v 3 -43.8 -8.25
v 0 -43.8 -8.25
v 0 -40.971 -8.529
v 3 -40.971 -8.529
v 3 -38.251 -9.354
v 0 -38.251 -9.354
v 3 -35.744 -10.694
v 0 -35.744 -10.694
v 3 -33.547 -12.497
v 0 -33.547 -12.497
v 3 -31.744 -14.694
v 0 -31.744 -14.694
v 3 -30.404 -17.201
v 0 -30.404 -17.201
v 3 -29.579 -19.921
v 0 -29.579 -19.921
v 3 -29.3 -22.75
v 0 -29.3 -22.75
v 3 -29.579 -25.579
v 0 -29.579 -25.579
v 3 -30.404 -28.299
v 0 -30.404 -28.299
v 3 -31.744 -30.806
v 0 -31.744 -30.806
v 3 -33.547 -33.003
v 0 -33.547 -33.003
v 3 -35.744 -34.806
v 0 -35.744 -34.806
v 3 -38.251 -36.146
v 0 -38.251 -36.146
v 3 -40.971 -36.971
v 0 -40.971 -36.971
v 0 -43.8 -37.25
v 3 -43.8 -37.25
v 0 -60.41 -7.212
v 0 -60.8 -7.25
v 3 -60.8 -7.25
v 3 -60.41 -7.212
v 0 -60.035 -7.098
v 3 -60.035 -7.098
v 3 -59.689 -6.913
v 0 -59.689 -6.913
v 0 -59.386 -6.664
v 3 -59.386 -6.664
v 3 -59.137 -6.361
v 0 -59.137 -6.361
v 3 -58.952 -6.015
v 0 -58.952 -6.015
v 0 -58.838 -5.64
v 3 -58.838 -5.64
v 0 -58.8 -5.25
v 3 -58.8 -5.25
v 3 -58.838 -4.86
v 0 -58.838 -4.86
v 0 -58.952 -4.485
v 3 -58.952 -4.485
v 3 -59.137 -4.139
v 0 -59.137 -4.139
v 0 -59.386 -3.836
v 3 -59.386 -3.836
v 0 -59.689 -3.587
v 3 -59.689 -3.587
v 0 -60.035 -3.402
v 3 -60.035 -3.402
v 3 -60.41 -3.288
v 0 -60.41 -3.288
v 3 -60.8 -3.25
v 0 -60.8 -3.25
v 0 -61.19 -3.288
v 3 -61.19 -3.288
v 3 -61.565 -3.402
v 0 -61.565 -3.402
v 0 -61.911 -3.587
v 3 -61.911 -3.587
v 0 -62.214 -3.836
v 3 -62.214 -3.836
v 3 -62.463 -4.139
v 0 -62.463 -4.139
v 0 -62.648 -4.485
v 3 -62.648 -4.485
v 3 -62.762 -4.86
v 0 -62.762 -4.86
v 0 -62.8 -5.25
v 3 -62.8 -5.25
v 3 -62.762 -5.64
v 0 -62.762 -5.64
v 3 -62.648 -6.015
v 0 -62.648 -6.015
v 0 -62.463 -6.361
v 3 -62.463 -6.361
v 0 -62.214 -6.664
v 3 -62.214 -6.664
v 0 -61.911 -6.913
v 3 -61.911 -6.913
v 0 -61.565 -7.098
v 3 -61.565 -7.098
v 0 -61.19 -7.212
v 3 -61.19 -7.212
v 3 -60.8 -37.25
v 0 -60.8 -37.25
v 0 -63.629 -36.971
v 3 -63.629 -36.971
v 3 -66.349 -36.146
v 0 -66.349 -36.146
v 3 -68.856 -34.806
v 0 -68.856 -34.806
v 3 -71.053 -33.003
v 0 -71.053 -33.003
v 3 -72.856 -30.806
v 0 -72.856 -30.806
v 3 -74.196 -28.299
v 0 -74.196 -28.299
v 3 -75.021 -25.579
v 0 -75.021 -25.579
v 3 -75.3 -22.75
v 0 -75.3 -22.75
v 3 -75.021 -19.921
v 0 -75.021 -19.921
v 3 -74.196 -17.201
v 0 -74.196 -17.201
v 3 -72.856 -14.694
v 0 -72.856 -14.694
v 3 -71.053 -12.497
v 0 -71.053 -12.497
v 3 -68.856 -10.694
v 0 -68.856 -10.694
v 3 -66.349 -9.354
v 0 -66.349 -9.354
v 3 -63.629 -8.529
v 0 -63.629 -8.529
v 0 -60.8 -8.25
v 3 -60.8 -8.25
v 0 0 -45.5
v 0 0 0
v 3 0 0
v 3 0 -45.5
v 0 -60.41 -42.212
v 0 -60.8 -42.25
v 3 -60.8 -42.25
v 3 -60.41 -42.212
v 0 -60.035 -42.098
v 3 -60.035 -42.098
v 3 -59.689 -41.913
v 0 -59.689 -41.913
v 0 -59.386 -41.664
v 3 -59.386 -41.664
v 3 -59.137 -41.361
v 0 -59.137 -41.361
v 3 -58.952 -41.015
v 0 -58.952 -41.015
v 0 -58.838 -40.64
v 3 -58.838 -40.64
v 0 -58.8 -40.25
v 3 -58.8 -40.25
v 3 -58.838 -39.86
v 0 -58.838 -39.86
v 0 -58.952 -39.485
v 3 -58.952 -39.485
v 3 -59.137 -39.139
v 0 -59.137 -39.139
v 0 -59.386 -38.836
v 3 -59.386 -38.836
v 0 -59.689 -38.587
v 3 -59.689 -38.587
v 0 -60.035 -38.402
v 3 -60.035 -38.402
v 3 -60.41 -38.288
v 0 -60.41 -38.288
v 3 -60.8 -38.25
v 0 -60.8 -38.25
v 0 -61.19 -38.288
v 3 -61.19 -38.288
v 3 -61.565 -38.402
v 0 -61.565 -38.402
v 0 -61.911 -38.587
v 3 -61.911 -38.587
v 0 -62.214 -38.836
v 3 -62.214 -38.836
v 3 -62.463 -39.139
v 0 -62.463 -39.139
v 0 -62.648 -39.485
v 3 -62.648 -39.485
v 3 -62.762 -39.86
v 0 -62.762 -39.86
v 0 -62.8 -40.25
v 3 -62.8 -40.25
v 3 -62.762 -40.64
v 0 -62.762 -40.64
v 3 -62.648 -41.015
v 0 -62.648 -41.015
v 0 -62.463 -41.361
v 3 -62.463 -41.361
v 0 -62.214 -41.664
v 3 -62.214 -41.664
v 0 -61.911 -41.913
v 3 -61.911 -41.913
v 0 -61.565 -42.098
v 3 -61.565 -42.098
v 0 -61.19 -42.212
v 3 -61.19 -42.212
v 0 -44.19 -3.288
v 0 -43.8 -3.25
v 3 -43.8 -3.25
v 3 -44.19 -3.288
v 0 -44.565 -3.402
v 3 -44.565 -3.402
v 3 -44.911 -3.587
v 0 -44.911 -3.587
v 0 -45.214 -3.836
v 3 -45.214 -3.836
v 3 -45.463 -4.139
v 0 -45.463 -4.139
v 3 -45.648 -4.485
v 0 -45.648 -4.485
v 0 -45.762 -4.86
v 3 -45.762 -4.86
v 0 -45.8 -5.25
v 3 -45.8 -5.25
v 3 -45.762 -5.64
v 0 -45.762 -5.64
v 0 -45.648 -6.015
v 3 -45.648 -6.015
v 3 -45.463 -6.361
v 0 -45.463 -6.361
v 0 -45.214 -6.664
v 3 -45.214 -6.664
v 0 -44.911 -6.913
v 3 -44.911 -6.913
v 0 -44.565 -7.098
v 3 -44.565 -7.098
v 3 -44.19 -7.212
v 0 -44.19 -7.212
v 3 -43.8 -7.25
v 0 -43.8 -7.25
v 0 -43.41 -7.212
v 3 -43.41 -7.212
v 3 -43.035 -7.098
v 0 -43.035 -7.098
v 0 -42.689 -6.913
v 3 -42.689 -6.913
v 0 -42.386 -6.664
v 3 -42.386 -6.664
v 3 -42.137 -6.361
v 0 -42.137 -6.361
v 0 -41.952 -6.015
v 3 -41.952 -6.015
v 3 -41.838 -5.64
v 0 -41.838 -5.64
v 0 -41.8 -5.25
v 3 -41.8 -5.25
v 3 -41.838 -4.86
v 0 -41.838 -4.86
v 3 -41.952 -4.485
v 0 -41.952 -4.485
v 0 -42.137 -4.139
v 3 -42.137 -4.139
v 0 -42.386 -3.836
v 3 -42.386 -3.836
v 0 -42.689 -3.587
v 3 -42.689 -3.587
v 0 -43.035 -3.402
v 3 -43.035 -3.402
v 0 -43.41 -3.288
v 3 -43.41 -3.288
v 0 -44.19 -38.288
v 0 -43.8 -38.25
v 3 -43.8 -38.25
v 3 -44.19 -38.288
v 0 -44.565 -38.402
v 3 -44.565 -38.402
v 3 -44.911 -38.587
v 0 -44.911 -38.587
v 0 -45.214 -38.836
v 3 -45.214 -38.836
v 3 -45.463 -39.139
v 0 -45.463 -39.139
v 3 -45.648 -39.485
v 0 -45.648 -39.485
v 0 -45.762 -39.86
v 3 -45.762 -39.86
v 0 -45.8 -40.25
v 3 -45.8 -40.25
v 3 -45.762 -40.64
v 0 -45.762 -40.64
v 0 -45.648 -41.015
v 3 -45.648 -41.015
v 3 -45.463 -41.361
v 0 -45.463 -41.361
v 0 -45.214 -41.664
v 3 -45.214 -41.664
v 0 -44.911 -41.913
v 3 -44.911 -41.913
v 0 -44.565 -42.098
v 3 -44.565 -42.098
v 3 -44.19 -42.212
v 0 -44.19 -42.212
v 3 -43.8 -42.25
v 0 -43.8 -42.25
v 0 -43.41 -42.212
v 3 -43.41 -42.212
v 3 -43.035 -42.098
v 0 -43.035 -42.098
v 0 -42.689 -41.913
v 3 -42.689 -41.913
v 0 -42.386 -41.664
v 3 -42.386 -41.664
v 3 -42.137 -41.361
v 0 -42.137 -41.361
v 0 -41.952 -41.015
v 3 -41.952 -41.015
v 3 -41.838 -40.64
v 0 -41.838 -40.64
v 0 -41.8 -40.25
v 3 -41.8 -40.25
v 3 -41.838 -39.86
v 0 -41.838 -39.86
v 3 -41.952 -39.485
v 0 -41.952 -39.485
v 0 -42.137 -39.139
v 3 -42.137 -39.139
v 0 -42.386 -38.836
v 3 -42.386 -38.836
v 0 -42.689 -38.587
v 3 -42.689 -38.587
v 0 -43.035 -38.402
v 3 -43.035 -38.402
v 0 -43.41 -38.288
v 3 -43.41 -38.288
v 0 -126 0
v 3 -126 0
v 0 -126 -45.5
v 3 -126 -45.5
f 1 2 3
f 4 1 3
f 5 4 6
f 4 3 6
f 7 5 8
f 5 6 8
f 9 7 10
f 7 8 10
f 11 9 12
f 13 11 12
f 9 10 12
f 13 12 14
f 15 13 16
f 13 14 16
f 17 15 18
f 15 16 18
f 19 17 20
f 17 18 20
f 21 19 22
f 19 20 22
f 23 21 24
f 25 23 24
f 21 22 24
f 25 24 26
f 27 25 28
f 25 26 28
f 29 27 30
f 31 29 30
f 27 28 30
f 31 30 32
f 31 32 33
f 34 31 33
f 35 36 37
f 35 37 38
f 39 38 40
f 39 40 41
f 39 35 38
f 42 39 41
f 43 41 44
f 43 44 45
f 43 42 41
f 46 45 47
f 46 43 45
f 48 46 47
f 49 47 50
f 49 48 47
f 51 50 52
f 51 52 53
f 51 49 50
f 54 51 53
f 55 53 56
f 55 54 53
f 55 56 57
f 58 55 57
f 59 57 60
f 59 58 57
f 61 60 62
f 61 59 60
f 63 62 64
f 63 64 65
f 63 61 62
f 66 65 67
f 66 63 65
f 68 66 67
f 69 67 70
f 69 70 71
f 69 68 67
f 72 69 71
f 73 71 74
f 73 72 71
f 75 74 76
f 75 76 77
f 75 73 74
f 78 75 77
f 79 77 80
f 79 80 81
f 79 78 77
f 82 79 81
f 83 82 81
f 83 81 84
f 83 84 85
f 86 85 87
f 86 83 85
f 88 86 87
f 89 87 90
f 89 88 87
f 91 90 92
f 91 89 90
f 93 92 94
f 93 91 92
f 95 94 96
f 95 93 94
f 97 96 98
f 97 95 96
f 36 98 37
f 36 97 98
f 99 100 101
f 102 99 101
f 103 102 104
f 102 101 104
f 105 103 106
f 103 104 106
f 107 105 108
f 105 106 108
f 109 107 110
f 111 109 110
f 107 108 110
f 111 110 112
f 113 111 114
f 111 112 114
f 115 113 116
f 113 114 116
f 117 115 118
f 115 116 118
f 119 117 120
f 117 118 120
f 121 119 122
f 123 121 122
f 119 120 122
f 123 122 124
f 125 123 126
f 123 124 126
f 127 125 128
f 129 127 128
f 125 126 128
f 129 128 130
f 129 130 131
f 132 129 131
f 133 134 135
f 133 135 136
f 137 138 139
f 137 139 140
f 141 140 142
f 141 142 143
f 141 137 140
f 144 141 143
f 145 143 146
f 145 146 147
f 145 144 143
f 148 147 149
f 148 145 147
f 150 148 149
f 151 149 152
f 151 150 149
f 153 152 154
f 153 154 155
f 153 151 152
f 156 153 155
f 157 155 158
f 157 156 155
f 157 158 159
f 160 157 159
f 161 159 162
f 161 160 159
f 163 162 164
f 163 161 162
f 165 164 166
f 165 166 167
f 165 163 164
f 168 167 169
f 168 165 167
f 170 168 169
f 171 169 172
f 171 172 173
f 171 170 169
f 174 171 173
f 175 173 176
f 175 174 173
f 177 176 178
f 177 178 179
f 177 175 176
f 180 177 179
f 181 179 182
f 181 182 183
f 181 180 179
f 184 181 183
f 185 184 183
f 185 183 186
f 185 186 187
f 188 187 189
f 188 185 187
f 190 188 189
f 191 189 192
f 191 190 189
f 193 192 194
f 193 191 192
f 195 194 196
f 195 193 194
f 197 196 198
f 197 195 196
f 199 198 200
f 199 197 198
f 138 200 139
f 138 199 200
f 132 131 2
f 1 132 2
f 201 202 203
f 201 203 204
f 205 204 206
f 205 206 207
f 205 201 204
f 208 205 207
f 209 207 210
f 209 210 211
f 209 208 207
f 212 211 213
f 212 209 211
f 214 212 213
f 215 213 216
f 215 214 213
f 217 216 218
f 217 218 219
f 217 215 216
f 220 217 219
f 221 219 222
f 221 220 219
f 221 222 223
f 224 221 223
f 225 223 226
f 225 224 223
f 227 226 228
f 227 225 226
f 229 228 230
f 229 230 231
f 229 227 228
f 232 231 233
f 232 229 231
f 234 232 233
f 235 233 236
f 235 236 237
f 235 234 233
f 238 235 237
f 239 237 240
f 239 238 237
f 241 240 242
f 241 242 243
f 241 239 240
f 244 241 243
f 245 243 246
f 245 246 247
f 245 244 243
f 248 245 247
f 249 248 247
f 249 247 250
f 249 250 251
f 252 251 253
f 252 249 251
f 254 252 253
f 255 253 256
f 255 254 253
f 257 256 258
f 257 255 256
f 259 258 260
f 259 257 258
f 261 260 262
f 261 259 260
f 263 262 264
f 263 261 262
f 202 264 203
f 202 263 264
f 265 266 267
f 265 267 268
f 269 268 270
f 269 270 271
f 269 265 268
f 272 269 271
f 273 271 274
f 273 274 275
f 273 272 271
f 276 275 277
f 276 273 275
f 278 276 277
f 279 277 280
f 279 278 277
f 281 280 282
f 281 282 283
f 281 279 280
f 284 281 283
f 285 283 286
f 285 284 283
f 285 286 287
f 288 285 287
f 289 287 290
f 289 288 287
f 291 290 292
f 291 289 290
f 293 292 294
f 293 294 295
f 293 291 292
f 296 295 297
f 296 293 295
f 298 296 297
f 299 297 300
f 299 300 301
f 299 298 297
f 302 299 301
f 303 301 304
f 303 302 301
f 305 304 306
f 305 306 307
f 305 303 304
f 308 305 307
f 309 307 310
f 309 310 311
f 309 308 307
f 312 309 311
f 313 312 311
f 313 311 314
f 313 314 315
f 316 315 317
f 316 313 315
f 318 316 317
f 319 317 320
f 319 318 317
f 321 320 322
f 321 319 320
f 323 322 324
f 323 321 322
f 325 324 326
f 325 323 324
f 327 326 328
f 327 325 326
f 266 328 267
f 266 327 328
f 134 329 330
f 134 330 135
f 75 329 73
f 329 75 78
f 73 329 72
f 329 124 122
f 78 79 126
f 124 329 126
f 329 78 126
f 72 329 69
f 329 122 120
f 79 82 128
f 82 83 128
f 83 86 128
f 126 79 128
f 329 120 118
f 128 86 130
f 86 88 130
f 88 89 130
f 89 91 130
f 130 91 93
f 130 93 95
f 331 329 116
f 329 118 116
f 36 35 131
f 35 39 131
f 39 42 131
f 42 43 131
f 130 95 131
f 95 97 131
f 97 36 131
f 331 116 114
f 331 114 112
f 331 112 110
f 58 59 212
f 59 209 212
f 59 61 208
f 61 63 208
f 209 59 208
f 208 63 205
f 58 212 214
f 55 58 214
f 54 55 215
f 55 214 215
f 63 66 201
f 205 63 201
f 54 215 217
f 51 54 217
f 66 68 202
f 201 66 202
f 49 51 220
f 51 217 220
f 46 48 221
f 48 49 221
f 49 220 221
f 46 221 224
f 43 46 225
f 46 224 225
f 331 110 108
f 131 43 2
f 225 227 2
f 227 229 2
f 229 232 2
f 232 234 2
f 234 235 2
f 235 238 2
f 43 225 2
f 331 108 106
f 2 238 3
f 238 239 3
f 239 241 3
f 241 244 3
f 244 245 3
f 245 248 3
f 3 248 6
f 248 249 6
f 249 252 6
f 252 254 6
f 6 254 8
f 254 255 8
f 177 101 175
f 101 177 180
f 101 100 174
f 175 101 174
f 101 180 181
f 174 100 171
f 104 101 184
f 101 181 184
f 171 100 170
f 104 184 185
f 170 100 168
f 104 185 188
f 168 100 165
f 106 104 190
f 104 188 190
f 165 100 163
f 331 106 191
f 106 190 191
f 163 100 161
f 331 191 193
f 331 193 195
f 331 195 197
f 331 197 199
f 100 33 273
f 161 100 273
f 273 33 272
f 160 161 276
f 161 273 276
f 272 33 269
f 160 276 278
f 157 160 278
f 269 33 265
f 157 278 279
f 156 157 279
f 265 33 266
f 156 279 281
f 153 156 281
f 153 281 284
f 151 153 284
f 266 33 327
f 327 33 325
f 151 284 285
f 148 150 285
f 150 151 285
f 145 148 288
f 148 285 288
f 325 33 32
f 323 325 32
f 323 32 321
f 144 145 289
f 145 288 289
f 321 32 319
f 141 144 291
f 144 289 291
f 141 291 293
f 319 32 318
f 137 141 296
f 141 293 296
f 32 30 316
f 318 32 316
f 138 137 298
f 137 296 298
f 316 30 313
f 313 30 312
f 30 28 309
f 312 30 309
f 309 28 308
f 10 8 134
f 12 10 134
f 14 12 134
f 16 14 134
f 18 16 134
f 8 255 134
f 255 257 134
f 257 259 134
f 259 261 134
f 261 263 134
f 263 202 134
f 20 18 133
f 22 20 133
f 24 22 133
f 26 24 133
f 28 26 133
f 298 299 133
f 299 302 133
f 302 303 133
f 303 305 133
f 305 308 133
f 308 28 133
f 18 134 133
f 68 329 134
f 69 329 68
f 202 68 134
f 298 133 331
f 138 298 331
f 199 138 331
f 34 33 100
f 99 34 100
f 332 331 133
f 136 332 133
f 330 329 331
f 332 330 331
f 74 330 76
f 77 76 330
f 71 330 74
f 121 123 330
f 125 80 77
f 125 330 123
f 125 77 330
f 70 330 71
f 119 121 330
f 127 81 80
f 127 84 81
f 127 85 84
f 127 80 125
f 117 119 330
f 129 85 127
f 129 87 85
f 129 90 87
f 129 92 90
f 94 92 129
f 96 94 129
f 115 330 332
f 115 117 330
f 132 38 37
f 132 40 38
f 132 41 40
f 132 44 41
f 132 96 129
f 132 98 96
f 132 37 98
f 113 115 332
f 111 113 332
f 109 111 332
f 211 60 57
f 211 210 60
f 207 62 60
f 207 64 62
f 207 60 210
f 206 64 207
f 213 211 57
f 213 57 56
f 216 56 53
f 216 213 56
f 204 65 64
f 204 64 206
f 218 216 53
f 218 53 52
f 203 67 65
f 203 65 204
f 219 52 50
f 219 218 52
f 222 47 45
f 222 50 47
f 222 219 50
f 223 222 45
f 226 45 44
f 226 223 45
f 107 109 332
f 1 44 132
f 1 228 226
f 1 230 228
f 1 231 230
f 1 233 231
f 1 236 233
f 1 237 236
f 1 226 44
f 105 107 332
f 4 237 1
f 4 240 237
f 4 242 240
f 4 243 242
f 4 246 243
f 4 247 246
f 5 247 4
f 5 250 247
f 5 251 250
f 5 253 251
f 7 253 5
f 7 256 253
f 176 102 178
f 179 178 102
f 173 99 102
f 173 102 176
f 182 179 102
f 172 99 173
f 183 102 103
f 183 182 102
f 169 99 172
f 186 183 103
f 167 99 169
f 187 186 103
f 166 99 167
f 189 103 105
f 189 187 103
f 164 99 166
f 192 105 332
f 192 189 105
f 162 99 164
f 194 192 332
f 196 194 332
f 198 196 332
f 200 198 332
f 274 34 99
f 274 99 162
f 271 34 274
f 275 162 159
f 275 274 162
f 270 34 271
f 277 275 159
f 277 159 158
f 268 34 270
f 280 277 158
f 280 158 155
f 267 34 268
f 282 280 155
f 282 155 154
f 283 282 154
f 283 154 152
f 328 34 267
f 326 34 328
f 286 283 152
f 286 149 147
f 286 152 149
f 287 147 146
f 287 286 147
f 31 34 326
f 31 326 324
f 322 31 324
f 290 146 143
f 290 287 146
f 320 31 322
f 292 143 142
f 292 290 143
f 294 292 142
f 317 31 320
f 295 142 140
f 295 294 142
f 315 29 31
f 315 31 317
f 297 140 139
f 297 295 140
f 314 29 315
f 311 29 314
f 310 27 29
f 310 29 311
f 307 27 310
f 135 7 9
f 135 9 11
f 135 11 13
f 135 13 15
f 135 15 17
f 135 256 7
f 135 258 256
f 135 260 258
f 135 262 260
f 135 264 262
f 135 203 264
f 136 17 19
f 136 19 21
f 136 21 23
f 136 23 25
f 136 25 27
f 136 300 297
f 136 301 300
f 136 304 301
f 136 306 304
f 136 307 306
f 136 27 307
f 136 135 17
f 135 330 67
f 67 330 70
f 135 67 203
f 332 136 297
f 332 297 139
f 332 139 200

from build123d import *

# Parameters (mm, degrees)
SKETCH1_W           = 45.5
SKETCH1_H           = 126
SKETCH1_R           = 2
BOSS_EXTRUDE1_DEPTH = 3


with BuildPart() as part:
    # Sketch1 → Boss-Extrude1 (new body)
    with BuildSketch(Plane(origin=(0, 0, 0), x_dir=(0, 0, -1), z_dir=(1, 0, 0))):
        with Locations((22.75, -63)):
            Rectangle(SKETCH1_W, SKETCH1_H)
        with Locations((5.25, -60.8)):
            Circle(SKETCH1_R, mode=Mode.SUBTRACT)
        with Locations((40.25, -60.8)):
            Circle(SKETCH1_R, mode=Mode.SUBTRACT)
        with Locations(Location((40.25, -43.8, 0), (0, 0, 180))):
            Circle(SKETCH1_R, mode=Mode.SUBTRACT)
        with Locations(Location((5.25, -43.8, 0), (0, 0, 180))):
            Circle(SKETCH1_R, mode=Mode.SUBTRACT)
        with BuildLine():
            Line((8.25, -60.8), (8.25, -43.8))
            ThreePointArc((8.25, -43.8), (22.75, -29.3), (37.25, -43.8))
            Line((37.25, -43.8), (37.25, -60.8))
            ThreePointArc((37.25, -60.8), (22.75, -75.3), (8.25, -60.8))
        make_face(mode=Mode.SUBTRACT)
    extrude(amount=BOSS_EXTRUDE1_DEPTH)


solid = part.part
